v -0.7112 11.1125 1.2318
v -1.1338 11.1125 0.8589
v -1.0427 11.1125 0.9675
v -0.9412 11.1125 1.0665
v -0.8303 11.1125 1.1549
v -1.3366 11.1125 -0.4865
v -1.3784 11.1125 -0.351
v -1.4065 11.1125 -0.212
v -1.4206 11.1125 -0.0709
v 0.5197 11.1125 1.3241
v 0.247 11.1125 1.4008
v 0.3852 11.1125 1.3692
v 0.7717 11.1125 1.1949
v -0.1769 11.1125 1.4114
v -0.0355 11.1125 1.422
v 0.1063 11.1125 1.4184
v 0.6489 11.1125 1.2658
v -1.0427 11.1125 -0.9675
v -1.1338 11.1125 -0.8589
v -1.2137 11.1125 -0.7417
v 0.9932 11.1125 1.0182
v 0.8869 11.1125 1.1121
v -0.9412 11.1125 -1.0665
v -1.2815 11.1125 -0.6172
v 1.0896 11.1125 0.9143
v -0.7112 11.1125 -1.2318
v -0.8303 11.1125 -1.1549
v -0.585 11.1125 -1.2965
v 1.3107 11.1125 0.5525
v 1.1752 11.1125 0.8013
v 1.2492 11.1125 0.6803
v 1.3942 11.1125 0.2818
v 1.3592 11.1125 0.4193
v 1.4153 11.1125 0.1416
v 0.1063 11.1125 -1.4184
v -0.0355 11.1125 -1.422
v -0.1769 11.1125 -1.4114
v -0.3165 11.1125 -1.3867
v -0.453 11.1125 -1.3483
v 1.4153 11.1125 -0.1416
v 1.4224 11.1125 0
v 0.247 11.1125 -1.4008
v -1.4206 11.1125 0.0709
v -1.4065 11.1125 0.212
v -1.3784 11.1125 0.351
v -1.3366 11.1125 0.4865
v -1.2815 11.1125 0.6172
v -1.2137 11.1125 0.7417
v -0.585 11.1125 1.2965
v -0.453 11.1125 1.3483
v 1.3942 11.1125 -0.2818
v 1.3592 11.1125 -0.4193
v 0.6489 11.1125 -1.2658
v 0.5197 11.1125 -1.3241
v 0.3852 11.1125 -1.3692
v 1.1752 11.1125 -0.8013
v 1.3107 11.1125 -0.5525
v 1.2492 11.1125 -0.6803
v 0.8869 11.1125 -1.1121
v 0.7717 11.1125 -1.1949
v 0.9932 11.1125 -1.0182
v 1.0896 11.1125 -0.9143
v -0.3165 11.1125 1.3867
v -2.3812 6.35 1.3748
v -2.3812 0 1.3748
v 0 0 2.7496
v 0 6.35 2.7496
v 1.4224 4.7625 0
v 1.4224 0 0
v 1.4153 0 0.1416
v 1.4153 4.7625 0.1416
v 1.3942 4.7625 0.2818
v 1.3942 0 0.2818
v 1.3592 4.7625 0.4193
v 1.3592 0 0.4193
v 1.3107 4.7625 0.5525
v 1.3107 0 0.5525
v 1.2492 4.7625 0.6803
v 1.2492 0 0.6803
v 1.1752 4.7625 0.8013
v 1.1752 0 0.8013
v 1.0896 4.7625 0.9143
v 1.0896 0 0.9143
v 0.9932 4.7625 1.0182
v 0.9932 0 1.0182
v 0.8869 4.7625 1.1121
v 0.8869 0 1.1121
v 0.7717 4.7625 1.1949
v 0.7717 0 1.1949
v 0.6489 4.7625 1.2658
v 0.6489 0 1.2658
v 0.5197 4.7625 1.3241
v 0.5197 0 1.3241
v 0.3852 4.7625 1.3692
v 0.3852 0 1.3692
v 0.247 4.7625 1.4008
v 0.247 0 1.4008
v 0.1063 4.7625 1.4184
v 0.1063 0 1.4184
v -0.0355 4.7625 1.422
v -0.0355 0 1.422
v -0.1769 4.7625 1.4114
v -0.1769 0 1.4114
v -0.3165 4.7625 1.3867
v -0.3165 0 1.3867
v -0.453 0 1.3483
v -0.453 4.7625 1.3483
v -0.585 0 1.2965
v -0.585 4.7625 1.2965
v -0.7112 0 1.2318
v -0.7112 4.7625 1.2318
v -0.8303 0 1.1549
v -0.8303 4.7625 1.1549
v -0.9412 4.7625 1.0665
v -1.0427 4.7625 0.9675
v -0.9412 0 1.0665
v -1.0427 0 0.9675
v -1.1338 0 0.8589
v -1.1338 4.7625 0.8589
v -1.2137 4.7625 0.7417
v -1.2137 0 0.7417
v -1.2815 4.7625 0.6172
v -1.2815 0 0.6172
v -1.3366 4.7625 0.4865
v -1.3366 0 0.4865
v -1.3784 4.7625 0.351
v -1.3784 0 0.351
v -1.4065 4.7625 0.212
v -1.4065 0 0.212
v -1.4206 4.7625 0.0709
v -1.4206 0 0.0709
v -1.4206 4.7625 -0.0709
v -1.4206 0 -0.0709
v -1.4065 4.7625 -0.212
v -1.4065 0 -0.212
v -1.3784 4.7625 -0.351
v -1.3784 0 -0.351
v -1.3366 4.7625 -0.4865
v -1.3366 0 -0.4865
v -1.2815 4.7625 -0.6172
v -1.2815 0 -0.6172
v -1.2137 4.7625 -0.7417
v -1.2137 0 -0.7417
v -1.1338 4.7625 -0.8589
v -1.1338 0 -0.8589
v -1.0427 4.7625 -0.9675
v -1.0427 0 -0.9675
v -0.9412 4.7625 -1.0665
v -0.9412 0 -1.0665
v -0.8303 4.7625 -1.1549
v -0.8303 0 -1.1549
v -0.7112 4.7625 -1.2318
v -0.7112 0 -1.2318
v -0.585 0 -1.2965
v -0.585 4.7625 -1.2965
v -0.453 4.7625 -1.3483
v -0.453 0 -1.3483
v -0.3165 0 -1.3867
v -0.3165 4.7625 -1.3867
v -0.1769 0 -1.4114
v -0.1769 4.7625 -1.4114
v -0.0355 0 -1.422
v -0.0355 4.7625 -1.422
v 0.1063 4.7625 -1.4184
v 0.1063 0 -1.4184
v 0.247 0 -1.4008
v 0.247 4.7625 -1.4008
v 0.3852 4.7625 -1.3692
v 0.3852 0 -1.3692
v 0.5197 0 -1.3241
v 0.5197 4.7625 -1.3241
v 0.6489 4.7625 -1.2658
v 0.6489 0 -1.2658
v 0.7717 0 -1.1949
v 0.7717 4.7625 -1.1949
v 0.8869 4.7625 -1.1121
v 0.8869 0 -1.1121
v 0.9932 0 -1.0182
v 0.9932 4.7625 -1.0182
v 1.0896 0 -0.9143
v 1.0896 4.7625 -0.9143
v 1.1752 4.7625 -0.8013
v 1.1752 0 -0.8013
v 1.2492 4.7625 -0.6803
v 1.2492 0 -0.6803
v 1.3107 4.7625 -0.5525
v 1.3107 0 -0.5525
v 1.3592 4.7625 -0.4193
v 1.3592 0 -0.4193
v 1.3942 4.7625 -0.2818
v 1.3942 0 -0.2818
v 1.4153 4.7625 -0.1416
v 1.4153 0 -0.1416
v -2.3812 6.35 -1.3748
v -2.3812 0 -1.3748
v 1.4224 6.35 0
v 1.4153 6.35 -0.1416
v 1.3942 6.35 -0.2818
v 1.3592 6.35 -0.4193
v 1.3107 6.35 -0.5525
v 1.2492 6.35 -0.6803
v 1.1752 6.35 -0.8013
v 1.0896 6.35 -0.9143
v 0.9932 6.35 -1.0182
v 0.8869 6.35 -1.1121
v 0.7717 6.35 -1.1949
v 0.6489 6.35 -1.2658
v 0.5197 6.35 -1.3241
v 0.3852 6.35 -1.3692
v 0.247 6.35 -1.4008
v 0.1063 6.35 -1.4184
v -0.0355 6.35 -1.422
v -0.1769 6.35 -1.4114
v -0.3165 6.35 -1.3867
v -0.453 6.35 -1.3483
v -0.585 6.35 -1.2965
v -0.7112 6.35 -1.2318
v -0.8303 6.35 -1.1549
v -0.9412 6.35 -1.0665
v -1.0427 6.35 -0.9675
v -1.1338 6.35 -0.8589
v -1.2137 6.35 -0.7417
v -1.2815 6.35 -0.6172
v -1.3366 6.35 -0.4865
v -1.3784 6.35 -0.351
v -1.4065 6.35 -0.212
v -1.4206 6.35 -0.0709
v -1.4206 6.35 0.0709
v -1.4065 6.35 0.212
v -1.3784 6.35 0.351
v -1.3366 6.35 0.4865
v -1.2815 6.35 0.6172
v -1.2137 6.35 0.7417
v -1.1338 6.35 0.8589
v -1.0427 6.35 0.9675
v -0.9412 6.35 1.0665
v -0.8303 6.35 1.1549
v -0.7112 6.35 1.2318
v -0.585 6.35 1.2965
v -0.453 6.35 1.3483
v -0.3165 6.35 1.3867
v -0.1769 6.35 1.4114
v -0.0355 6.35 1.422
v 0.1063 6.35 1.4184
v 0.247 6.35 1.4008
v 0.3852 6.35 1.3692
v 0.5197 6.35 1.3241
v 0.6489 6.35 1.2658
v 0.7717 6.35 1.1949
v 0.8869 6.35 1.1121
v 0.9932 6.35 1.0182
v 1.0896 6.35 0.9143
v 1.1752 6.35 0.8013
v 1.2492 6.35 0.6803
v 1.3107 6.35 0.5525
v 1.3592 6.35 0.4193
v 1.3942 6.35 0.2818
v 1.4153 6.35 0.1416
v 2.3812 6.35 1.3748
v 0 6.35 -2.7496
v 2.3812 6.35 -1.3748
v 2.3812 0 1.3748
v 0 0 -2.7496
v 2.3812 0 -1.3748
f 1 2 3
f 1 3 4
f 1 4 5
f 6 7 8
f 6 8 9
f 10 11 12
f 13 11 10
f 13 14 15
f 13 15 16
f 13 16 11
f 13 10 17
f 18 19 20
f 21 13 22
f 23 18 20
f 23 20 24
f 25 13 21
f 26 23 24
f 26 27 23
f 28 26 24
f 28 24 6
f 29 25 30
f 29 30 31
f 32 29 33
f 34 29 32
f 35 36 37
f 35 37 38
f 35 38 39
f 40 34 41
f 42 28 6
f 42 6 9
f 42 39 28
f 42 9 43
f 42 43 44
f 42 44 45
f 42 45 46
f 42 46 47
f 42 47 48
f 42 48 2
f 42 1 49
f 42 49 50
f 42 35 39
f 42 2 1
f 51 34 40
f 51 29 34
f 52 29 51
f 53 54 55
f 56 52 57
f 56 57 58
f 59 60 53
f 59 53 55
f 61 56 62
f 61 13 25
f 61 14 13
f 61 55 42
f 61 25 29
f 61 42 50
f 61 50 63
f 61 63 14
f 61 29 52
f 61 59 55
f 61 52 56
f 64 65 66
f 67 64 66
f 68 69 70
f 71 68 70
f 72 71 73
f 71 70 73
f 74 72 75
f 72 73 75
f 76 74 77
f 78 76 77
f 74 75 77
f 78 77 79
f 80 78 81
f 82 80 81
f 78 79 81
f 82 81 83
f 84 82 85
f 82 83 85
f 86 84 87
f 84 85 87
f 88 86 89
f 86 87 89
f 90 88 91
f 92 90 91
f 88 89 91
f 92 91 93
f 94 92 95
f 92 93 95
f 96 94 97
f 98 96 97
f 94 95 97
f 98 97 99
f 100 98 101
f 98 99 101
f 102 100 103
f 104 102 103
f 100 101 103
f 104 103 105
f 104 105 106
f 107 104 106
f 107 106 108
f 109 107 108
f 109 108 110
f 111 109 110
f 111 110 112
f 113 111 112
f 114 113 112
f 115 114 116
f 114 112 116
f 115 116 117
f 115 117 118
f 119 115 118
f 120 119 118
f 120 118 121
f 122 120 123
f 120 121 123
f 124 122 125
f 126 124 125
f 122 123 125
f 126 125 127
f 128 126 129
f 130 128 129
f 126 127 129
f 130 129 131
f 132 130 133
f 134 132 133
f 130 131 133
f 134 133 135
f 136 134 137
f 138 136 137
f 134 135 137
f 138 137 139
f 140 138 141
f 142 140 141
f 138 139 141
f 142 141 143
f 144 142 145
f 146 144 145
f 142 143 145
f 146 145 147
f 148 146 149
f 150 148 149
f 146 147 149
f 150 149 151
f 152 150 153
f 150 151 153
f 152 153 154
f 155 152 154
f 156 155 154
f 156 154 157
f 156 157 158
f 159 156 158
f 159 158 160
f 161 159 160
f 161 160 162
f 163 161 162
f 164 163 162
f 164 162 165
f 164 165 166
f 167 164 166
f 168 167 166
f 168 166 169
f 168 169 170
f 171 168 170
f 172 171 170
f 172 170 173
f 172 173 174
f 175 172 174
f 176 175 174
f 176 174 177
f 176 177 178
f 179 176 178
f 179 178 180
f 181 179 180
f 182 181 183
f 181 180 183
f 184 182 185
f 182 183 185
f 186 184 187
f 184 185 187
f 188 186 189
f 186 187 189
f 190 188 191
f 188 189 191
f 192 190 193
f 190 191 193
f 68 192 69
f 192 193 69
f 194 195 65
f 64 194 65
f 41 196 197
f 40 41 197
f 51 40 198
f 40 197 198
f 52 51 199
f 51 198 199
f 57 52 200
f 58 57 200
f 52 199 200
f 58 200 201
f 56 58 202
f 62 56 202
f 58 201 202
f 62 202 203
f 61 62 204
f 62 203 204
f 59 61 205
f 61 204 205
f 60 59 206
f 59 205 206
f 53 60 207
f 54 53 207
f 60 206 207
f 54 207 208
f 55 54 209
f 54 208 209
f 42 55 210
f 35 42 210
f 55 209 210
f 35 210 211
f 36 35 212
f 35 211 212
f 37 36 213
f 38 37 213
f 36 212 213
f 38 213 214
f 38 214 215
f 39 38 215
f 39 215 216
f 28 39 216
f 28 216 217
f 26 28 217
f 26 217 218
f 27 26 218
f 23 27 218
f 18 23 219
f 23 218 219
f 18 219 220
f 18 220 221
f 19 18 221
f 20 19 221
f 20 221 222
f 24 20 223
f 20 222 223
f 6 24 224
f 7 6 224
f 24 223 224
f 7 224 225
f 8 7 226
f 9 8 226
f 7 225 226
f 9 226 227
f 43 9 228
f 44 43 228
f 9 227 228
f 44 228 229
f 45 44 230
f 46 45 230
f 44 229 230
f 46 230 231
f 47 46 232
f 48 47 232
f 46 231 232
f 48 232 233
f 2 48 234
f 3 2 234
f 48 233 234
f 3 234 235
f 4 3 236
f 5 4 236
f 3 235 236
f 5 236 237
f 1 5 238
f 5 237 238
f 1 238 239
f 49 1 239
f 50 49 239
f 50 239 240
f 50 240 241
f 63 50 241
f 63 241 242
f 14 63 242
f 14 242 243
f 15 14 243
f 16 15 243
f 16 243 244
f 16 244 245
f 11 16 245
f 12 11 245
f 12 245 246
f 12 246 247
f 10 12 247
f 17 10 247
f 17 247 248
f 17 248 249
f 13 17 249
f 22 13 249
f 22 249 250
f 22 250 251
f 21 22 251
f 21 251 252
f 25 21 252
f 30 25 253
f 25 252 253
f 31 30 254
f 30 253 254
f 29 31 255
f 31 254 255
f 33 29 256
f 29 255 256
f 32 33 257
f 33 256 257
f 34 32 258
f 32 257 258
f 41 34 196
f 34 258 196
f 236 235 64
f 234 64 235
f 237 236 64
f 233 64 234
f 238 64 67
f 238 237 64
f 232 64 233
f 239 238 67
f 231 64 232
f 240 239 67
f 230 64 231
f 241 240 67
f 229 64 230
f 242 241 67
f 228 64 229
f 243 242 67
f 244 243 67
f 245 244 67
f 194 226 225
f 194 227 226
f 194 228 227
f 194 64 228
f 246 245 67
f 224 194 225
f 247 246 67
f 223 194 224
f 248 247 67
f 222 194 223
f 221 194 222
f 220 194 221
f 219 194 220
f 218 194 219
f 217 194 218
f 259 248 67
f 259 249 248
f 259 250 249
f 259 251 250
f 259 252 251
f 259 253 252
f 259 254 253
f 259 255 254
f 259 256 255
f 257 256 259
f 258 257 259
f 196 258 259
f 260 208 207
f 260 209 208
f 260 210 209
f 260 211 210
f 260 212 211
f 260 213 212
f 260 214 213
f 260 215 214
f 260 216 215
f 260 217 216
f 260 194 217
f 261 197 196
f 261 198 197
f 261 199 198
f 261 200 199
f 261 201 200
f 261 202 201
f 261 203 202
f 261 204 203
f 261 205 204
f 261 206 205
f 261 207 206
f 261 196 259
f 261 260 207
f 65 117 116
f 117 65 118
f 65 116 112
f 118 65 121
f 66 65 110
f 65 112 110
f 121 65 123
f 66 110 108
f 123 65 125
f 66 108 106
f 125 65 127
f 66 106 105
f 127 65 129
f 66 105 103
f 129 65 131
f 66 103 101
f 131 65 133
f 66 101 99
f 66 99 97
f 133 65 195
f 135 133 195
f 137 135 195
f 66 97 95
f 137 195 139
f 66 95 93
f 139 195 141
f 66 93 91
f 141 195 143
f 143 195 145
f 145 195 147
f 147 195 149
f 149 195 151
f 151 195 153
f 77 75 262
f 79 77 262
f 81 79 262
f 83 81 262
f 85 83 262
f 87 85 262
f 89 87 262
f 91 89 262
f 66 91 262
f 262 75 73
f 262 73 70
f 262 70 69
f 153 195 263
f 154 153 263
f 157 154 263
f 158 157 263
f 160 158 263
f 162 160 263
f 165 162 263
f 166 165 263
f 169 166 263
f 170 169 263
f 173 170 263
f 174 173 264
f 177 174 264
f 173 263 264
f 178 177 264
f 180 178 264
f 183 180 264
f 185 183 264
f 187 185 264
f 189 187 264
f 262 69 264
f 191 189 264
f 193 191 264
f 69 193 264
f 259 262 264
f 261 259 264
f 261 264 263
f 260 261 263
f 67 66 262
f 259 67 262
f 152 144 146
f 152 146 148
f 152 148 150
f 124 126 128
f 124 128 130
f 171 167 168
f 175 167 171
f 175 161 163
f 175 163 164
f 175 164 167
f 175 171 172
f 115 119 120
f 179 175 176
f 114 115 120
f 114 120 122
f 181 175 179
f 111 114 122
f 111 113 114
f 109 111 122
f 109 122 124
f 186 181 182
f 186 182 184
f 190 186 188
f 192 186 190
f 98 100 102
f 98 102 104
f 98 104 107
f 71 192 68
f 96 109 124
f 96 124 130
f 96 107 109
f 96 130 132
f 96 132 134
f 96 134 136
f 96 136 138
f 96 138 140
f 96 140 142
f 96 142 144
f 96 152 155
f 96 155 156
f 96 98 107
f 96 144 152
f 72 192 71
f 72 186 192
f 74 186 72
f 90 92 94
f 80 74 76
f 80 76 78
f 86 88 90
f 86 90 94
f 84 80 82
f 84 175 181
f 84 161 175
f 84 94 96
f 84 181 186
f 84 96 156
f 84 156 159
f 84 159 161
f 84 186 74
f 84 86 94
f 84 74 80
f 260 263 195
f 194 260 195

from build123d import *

# Parameters (mm, degrees)
BOSS_EXTRUDE1_DEPTH = 6.35
SKETCH2_R           = 1.4224
BOSS_EXTRUDE2_DEPTH = 4.7625
SKETCH7_R           = 1.4224
CUT_EXTRUDE4_DEPTH  = 4.7625


with BuildPart() as part:
    # Sketch1 → Boss-Extrude1 (new body)
    with BuildSketch(Plane(origin=(0, 0, 0), x_dir=(1, 0, 0), z_dir=(0, 1, 0))):
        Polygon((-2.38125, 1.374815329), (-2.38125, -1.374815329), (0, -2.749630657), (2.38125, -1.374815329), (2.38125, 1.374815329), (0, 2.749630657), align=None)
    extrude(amount=BOSS_EXTRUDE1_DEPTH)

    # Sketch2 → Boss-Extrude2 (add)
    with BuildSketch(Plane(origin=(0, 6.35, 0), x_dir=(1, 0, 0), z_dir=(0, 1, 0))):
        Circle(SKETCH2_R)
    extrude(amount=BOSS_EXTRUDE2_DEPTH)

    # Sketch7 → Cut-Extrude4 (cut)
    with BuildSketch(Plane.XZ):
        Circle(SKETCH7_R)
    extrude(amount=-CUT_EXTRUDE4_DEPTH, mode=Mode.SUBTRACT)


solid = part.part
